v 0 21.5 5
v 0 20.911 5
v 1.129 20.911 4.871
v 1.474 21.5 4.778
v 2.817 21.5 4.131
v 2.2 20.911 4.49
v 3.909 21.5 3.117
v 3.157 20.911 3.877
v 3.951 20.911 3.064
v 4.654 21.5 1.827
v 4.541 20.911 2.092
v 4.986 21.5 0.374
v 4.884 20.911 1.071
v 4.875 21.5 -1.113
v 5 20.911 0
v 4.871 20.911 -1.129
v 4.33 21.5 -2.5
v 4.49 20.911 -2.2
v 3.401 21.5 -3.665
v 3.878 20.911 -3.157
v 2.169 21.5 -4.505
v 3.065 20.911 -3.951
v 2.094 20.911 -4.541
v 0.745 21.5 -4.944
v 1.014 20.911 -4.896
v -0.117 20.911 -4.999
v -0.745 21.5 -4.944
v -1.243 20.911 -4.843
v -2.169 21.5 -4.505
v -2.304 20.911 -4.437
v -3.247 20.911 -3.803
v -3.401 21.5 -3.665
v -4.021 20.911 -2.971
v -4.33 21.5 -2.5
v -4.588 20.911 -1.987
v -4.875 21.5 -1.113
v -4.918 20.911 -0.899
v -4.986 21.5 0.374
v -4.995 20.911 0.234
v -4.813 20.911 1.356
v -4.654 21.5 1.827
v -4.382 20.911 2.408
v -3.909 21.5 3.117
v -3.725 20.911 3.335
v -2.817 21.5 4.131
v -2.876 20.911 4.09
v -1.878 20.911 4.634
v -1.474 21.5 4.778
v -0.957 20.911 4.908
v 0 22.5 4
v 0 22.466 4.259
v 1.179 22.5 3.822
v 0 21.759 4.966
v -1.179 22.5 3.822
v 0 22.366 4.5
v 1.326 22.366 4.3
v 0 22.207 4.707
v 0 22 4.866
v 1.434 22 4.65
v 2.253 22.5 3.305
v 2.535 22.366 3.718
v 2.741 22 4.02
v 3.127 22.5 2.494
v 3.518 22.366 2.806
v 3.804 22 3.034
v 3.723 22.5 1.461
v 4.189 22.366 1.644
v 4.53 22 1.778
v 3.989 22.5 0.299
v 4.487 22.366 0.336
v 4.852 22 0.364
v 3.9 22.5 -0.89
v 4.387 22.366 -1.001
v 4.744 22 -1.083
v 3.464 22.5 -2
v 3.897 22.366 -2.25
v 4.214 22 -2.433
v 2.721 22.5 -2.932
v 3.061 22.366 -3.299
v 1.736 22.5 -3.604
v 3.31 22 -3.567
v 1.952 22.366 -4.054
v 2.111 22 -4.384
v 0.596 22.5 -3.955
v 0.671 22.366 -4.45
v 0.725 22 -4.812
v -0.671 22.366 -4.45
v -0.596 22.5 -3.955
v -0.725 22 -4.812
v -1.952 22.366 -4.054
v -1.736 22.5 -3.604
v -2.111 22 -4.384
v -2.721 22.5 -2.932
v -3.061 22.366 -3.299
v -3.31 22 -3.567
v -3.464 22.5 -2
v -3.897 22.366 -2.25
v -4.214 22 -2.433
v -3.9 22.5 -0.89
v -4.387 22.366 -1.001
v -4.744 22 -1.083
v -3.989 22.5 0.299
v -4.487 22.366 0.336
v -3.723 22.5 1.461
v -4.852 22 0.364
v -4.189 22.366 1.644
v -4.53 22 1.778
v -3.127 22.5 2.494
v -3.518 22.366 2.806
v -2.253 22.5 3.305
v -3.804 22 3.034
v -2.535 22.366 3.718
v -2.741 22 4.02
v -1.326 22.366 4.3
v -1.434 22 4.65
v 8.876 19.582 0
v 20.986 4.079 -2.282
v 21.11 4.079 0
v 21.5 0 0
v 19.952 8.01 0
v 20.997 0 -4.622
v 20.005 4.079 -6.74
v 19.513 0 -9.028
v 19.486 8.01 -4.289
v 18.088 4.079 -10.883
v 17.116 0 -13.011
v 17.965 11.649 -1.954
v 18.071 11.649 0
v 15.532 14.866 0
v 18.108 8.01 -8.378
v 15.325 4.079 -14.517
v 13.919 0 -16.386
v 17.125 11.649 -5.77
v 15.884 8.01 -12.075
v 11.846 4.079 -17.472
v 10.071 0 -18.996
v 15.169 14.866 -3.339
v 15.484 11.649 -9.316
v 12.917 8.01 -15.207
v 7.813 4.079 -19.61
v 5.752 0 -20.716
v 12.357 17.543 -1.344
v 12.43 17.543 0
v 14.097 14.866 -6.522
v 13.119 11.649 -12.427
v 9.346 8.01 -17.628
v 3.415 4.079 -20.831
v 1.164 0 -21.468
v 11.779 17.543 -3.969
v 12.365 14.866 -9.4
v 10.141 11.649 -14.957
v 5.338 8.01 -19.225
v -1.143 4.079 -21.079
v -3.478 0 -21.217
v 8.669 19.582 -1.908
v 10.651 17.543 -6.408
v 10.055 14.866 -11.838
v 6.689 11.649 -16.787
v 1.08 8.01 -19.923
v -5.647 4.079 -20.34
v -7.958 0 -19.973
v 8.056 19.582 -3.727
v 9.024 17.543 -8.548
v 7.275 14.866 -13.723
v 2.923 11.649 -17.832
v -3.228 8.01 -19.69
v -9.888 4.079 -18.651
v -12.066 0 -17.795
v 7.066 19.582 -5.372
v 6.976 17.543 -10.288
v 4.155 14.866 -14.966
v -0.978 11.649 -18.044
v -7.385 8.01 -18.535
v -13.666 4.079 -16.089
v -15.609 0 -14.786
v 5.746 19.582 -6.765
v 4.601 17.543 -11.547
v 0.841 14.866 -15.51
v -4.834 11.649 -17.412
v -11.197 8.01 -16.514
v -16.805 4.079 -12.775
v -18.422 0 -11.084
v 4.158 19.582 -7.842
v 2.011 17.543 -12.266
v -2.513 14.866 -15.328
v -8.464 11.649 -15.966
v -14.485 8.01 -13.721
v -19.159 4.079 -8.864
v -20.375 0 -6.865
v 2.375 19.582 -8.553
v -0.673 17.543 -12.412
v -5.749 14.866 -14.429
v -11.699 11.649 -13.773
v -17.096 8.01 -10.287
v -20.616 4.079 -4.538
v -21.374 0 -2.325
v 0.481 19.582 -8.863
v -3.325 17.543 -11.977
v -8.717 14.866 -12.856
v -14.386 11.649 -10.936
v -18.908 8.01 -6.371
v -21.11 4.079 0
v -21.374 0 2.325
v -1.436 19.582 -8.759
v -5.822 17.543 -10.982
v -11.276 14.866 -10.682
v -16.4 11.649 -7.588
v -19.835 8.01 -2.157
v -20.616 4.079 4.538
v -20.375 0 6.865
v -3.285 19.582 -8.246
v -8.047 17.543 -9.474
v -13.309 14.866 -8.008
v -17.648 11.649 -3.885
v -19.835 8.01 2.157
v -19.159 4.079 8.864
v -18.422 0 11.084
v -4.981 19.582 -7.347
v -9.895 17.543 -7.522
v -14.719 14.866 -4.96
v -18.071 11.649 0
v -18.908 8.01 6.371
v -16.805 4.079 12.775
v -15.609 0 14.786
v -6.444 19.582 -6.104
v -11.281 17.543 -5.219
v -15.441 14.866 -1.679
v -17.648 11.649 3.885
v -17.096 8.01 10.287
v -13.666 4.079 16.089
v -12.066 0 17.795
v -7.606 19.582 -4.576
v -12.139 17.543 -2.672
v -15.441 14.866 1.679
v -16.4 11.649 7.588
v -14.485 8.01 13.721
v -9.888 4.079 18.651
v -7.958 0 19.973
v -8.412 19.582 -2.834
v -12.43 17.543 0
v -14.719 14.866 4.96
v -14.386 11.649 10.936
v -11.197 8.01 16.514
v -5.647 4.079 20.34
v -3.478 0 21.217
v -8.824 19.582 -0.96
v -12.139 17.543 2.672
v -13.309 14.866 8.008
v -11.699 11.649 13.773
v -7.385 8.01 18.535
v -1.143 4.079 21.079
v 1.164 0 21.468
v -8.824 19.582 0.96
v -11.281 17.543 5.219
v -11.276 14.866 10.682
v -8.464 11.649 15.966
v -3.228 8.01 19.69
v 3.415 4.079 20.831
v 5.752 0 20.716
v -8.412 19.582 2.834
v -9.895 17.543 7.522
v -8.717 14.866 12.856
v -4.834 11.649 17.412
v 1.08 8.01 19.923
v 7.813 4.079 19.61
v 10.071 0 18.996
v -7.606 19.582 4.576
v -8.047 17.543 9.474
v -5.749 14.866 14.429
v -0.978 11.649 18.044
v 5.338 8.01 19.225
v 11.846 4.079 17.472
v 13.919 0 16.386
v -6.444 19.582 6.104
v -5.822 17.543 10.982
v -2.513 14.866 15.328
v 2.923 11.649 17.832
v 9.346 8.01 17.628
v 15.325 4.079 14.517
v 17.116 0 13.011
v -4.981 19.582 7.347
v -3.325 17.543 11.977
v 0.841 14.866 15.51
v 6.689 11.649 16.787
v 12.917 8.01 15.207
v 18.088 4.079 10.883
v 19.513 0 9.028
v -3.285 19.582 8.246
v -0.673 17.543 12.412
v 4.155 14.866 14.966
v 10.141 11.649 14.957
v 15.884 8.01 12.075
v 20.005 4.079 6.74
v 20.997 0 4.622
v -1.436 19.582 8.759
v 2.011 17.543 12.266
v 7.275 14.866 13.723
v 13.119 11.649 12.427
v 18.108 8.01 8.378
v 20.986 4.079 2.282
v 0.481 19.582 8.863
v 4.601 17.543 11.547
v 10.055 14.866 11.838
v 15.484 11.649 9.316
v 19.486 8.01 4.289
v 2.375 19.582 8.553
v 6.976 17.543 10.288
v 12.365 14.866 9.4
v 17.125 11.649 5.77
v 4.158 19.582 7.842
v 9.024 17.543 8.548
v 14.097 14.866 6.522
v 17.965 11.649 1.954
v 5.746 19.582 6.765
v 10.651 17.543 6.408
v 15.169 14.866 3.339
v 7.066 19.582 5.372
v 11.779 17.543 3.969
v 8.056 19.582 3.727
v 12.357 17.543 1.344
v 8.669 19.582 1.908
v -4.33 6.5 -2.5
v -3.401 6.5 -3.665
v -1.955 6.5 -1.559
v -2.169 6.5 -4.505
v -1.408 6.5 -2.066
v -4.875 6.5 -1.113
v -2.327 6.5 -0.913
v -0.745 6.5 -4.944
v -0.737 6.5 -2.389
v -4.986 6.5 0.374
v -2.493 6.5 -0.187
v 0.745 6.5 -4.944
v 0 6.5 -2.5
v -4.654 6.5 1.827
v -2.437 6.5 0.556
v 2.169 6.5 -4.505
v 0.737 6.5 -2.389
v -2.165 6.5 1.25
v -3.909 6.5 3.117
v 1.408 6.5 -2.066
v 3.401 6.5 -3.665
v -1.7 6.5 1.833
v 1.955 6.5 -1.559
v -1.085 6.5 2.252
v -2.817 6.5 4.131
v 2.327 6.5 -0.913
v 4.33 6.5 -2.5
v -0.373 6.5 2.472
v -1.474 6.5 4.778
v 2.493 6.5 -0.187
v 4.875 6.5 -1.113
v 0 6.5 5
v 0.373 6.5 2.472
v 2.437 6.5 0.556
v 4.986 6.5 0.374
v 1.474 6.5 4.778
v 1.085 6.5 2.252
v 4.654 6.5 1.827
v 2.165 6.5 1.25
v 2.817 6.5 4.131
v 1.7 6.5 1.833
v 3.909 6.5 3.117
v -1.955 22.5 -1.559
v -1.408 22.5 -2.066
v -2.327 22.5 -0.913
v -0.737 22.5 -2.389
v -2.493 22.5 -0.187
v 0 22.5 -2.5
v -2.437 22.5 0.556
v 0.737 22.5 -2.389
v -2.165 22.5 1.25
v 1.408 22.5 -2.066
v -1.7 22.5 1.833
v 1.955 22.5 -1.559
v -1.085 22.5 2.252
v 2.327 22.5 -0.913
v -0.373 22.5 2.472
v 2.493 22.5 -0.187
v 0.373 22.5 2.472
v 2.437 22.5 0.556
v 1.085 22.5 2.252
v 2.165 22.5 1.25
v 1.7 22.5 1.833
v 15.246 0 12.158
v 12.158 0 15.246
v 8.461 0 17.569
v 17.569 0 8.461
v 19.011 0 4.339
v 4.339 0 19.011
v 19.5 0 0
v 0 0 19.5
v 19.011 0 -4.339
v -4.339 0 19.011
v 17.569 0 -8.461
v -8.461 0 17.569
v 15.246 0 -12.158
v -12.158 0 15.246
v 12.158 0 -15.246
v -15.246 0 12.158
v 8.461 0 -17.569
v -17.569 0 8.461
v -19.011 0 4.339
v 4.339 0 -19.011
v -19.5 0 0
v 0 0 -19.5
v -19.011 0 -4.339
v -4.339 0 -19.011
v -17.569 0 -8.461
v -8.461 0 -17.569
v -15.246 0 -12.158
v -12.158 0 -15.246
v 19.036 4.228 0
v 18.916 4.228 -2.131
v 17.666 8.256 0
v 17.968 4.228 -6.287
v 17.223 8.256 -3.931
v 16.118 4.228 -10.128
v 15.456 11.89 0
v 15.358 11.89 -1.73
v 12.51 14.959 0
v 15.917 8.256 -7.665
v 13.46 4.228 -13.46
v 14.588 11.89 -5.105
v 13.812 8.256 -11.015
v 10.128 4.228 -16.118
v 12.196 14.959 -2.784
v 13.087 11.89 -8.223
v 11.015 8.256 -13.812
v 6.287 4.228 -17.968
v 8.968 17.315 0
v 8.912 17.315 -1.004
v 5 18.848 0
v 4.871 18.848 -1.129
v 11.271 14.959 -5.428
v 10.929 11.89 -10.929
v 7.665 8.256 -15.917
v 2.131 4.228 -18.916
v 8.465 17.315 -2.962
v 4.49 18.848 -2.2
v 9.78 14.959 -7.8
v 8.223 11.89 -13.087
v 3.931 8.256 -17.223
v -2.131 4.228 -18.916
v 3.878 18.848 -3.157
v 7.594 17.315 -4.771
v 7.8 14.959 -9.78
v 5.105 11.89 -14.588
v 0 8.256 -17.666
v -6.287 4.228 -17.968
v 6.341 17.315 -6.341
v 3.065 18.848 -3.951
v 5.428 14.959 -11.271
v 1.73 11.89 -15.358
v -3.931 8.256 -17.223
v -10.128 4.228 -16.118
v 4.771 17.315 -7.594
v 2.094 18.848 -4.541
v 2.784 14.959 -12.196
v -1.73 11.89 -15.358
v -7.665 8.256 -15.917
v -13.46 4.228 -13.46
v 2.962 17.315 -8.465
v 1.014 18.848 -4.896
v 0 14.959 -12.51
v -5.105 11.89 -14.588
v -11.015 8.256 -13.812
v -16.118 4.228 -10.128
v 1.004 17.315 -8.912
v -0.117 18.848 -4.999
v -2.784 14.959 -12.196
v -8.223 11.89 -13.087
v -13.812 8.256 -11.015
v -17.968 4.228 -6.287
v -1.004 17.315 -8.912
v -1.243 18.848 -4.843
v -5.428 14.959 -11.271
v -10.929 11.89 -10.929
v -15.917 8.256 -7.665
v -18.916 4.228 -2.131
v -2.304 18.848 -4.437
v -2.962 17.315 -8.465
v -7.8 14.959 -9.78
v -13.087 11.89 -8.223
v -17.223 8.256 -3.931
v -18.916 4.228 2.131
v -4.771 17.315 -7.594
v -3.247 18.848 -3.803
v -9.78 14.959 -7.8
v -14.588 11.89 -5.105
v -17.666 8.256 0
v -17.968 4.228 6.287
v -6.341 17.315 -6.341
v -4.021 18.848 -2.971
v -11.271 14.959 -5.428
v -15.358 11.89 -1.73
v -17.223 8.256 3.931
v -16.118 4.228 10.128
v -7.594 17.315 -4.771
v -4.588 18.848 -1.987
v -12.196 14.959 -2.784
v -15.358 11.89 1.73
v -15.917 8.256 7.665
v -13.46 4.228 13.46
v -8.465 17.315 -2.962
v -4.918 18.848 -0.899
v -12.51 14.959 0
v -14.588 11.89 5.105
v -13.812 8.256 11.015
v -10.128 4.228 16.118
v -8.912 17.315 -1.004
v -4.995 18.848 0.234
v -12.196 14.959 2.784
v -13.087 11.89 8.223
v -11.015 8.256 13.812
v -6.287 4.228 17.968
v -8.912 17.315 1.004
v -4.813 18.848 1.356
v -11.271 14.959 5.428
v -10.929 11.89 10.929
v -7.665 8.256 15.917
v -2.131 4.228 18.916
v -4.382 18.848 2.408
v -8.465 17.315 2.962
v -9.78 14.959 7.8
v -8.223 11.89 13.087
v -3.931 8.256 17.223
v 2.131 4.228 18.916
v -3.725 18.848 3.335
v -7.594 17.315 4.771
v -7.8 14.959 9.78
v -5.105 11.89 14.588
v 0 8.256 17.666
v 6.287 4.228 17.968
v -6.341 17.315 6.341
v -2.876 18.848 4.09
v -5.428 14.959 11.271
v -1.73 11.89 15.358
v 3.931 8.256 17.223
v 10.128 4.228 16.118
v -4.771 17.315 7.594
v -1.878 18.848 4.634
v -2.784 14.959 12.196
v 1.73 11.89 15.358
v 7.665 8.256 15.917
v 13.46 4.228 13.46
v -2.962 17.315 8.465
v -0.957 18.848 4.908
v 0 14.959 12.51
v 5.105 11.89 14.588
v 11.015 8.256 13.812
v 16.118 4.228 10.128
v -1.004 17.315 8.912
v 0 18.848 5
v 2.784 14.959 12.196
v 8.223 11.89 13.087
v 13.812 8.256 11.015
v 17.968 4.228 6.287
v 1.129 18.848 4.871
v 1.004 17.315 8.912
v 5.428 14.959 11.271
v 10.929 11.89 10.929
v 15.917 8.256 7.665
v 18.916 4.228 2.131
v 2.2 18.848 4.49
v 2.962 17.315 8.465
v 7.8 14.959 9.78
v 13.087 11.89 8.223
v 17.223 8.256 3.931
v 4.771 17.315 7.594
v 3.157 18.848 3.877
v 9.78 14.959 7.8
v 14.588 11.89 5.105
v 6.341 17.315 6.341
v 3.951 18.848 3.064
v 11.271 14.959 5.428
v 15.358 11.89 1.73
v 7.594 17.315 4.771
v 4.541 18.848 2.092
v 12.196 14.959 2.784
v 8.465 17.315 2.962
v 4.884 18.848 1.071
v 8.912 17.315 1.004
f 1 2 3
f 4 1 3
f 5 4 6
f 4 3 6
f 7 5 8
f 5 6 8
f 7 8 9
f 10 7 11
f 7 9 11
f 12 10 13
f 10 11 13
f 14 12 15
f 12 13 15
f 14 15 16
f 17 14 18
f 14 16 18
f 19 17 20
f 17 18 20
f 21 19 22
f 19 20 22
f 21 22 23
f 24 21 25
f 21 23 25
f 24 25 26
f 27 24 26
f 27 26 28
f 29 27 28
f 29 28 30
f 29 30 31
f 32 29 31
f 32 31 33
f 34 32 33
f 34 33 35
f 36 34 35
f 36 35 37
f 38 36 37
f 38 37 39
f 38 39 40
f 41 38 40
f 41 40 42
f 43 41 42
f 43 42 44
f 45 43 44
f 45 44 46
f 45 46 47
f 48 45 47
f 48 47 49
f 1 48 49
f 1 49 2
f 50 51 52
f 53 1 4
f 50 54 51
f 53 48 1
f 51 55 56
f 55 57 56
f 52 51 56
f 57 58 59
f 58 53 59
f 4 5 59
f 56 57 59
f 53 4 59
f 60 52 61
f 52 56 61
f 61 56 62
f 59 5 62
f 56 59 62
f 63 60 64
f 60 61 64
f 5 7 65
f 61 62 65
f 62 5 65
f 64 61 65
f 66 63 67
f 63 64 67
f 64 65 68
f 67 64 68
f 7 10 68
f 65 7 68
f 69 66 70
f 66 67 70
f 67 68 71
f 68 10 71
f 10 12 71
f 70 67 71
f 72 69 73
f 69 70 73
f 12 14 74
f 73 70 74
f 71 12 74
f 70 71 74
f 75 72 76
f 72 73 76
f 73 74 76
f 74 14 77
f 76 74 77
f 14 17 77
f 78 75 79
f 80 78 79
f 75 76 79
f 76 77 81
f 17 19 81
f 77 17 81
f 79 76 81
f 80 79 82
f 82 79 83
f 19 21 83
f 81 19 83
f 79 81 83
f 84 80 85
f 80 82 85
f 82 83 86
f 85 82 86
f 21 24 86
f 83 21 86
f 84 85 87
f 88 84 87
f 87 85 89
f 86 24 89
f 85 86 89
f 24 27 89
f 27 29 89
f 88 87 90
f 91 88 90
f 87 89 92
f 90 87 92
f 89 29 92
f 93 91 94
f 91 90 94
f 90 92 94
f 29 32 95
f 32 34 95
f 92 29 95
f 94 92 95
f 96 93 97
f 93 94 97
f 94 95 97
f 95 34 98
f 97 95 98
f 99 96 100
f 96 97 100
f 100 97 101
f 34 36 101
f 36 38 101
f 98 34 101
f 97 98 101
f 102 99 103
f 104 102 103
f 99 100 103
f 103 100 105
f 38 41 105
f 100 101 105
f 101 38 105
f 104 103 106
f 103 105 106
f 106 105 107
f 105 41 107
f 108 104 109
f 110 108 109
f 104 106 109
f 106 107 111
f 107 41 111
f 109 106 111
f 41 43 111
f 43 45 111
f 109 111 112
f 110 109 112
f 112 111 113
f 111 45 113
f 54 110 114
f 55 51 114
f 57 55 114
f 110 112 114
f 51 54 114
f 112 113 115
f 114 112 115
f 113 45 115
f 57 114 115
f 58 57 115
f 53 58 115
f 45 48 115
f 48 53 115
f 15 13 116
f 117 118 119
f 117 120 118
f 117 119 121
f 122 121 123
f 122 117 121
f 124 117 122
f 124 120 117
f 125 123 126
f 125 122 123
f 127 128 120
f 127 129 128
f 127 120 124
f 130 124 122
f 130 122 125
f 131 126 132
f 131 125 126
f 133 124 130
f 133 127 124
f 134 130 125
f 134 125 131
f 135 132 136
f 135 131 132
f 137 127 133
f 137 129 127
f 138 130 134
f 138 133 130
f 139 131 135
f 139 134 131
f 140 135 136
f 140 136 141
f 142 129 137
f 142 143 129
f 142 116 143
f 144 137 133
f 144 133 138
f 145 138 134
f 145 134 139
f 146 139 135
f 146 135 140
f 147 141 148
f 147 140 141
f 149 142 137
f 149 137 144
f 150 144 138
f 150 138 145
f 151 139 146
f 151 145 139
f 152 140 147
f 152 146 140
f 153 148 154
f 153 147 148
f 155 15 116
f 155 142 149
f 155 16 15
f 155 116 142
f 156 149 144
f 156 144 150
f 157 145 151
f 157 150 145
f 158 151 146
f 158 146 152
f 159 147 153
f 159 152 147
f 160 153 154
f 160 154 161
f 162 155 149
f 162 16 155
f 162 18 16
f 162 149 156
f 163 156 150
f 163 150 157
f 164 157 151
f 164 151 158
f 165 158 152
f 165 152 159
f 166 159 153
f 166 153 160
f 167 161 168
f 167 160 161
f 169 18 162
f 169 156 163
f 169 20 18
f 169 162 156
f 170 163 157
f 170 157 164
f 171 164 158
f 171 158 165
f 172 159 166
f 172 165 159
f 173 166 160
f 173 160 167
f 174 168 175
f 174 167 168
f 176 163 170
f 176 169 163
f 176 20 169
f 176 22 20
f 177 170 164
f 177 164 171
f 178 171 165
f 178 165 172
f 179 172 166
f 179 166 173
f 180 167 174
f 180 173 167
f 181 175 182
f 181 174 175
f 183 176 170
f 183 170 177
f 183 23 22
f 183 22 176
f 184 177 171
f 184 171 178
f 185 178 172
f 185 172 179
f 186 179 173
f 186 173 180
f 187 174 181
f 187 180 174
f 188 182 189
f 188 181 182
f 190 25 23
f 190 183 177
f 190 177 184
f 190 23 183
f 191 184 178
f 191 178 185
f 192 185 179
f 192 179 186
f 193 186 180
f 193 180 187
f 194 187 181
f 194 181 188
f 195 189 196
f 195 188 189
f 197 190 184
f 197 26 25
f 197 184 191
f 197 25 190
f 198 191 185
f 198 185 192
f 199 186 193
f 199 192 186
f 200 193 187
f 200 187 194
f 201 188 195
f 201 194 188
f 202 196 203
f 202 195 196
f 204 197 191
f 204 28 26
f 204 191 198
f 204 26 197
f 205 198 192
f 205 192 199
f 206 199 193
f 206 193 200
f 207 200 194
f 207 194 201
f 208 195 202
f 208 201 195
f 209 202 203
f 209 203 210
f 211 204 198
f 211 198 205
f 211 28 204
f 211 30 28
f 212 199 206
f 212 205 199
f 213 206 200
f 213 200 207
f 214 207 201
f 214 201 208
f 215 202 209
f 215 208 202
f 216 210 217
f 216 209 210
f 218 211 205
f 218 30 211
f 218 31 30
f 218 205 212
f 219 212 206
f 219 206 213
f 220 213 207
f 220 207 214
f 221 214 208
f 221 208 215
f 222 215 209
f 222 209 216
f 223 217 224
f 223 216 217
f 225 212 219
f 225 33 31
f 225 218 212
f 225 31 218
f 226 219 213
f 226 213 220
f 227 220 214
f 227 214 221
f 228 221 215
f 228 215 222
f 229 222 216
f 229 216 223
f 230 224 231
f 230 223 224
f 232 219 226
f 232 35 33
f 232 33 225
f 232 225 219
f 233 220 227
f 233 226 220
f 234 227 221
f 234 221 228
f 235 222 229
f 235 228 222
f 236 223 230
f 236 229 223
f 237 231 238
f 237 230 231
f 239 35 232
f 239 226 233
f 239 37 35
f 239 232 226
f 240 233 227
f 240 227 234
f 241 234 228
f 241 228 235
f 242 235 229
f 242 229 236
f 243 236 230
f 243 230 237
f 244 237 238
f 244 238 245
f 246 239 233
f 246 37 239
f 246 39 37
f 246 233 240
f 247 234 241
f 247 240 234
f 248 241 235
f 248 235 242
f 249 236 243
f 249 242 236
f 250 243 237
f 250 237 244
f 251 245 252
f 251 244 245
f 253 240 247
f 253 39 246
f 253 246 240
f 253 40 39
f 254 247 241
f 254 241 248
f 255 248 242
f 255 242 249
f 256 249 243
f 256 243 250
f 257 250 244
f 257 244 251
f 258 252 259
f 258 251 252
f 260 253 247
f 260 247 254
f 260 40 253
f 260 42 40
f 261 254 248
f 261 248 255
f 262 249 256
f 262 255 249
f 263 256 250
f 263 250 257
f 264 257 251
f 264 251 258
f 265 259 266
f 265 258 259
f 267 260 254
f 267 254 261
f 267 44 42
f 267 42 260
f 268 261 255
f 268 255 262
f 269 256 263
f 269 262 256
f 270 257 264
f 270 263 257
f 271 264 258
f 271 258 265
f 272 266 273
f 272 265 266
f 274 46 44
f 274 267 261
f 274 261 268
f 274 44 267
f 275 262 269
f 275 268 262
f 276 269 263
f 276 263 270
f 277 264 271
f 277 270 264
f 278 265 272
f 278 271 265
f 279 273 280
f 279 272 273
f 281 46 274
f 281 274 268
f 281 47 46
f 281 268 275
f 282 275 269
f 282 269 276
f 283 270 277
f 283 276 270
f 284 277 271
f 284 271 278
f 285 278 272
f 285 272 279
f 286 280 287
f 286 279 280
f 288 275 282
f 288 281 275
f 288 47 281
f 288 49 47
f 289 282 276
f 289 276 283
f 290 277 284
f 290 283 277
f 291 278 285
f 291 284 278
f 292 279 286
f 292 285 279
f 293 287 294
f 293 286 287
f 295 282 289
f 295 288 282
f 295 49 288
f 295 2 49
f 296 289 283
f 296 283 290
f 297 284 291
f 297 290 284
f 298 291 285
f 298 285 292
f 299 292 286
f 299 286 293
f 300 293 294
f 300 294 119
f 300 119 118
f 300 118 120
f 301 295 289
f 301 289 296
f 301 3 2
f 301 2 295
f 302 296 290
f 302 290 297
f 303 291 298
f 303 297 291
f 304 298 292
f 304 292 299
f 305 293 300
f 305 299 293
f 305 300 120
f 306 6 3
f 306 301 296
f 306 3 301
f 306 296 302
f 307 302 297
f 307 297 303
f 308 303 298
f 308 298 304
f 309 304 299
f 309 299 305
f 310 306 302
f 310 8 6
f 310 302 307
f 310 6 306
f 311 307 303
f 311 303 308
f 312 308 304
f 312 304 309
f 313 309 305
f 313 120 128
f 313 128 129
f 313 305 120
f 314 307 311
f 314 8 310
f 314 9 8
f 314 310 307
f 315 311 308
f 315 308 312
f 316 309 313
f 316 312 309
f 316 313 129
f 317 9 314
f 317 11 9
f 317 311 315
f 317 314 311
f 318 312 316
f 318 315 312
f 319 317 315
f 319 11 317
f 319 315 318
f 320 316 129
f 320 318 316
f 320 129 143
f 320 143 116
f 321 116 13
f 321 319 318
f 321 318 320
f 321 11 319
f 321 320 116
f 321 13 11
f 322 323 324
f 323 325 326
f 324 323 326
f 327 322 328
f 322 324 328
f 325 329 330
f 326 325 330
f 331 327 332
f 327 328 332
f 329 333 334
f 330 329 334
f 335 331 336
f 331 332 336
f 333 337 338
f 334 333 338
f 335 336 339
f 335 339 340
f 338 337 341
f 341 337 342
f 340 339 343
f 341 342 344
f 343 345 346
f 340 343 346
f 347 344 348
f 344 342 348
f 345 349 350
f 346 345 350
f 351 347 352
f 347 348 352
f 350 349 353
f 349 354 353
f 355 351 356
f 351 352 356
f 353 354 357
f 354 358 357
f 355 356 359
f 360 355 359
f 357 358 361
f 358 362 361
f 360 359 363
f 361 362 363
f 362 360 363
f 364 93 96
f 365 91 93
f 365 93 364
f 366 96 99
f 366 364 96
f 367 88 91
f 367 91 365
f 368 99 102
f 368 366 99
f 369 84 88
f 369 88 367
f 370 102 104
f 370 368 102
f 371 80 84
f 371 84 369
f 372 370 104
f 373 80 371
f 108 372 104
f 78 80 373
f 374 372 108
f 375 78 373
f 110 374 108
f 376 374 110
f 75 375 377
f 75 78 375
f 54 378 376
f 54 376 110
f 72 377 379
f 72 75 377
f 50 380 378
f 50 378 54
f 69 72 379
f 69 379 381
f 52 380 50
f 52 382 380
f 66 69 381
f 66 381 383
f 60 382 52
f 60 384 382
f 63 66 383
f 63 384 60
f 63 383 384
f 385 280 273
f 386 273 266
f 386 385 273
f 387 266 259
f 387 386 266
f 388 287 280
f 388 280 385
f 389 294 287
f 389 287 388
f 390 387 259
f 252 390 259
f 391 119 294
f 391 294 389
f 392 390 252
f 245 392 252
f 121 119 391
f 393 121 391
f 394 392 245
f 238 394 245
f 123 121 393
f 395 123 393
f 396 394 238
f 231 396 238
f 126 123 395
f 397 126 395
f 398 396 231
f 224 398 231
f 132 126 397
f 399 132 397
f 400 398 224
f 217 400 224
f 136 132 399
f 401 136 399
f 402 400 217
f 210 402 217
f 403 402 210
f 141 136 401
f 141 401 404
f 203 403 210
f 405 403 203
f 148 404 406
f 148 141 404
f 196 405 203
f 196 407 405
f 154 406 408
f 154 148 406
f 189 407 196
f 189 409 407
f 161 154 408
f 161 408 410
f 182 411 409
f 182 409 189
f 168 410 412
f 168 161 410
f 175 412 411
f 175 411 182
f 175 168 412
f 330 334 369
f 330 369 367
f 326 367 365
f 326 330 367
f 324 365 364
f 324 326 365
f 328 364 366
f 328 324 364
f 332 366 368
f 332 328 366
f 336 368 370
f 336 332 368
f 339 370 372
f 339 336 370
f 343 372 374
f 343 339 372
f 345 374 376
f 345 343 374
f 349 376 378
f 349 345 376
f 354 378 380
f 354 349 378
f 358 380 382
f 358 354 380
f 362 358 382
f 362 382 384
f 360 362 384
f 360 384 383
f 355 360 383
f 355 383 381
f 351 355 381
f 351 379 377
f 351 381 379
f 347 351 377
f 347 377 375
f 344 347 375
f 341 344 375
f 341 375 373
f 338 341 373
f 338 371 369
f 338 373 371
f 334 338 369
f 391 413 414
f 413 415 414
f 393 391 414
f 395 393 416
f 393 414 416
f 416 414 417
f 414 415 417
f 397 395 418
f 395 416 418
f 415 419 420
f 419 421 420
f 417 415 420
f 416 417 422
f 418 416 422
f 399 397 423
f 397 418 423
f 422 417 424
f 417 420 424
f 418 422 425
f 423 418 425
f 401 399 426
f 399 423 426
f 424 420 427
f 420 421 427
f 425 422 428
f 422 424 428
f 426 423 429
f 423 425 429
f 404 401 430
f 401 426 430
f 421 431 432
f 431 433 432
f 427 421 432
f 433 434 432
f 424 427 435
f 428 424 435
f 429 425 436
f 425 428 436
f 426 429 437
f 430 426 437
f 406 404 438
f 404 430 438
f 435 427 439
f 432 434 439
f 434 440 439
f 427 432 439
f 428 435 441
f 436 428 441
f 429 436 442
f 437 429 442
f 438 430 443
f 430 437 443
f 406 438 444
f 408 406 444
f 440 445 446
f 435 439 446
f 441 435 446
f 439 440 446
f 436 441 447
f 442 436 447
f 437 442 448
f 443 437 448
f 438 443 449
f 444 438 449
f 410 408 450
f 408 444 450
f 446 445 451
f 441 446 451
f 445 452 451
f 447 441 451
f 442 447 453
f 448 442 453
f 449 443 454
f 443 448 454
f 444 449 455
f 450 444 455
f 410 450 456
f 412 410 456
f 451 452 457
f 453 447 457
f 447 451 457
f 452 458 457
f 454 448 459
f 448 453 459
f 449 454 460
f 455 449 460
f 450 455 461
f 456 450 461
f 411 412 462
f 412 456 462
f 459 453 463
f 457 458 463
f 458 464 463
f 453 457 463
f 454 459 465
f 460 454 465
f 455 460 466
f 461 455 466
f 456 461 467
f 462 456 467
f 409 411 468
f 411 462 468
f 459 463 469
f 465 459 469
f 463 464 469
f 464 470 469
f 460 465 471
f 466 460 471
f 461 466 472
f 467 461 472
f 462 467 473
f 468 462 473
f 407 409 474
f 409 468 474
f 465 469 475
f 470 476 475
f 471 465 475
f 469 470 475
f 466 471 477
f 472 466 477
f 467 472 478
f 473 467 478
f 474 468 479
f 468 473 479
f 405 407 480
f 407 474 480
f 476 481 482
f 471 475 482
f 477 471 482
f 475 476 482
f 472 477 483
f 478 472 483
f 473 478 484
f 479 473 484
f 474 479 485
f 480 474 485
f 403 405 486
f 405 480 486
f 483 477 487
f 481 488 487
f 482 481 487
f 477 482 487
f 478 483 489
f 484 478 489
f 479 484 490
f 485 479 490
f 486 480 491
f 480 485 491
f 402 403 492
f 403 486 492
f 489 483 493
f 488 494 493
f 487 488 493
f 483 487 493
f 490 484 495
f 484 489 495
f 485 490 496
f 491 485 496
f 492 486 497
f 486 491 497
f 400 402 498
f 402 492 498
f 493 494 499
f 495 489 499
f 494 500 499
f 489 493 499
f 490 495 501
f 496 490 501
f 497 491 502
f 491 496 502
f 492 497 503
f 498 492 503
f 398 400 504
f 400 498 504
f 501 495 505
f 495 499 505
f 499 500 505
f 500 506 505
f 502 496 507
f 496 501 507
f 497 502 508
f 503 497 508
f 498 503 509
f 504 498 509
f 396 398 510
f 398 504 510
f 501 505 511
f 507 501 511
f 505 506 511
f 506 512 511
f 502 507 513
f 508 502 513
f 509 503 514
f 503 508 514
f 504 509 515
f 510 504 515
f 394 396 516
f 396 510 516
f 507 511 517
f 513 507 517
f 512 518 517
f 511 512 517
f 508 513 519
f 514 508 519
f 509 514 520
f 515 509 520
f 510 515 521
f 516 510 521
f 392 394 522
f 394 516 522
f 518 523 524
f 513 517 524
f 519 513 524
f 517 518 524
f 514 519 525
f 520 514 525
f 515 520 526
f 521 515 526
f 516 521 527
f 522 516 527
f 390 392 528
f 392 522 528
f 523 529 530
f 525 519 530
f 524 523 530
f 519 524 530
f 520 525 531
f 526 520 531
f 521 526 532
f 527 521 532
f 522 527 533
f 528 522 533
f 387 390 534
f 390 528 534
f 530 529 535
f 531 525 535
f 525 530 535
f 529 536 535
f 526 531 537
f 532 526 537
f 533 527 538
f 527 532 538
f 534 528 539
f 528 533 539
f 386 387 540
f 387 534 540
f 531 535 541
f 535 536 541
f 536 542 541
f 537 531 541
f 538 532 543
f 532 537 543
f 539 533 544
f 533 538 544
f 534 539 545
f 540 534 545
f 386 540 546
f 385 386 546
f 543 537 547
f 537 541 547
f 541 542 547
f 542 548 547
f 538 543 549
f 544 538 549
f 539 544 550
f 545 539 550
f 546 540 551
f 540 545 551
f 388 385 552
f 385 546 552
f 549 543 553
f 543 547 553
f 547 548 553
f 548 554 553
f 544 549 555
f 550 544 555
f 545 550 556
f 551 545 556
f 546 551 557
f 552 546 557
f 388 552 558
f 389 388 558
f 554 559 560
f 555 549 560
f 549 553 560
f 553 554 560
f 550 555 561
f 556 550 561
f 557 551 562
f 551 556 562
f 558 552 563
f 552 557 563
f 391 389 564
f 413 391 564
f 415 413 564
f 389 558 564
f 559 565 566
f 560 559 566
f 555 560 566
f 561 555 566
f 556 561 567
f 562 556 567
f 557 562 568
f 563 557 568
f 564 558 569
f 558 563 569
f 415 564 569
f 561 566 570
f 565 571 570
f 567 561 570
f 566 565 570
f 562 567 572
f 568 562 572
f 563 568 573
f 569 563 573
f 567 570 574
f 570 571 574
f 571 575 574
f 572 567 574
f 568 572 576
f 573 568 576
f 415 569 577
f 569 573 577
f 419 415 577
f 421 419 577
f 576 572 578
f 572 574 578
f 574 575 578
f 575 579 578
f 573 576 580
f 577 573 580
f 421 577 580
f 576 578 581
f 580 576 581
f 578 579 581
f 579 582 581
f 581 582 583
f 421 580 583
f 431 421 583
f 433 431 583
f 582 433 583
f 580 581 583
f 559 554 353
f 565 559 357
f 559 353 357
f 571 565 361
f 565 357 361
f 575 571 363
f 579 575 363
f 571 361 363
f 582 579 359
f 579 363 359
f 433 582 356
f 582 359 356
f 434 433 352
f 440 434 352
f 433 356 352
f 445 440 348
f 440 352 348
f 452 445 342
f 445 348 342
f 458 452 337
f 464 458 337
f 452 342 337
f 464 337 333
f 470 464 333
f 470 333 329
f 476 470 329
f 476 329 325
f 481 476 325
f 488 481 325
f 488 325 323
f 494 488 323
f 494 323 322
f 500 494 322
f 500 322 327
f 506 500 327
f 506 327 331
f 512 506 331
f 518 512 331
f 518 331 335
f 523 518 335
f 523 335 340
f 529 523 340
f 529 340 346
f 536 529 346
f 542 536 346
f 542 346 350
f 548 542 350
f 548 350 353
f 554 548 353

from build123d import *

# Parameters (mm, degrees)
SHELL1_T                 = -2
BOSS_EXTRUDE6_DEPTH      = 1
BOSS_EXTRUDE6_DEPTH_BACK = 15
SKETCH4_R                = 5
SKETCH2_R                = 2.5
CUT_EXTRUDE3_DEPTH       = 38.825256113
FILLET1_R                = 1


with BuildPart() as part:
    # Sketch1 → Revolve1 (revolve)
    with BuildSketch(Plane.XY):
        with BuildLine():
            Line((0, 0), (21.5, 0))
            ThreePointArc((21.5, 0), (15.202795796, 15.202795796), (0, 21.5))
            Line((0, 21.5), (0, 0))
        make_face()
    revolve(axis=Axis((0, 0, 0), (0, 1, 0)))

    # Shell1
    shell1_openings = [part.faces().sort_by_distance(p)[0] for p in [
        (0, 0, 0),
    ]]
    offset(amount=SHELL1_T, openings=shell1_openings, kind=Kind.INTERSECTION)

    # Sketch4 → Boss-Extrude6 (add, two sides: drawn at the far end of the back side and taken through both)
    with BuildSketch(Plane(origin=(0, 21.5, 0), x_dir=(1, 0, 0), z_dir=(0, 1, 0)).offset(-BOSS_EXTRUDE6_DEPTH_BACK)):
        with Locations(Location((0, 0, 0), (0, 0, 270))):
            Circle(SKETCH4_R)
    extrude(amount=BOSS_EXTRUDE6_DEPTH + BOSS_EXTRUDE6_DEPTH_BACK)

    # Sketch2 → Cut-Extrude3 (cut, through all)
    with BuildSketch(Plane(origin=(0, 0, 0), x_dir=(1, 0, 0), z_dir=(0, 1, 0))):
        with Locations(Location((0, 0, 0), (0, 0, 90))):
            Circle(SKETCH2_R)
    extrude(amount=CUT_EXTRUDE3_DEPTH, mode=Mode.SUBTRACT)

    # Fillet1
    fillet1_edges = [part.edges().sort_by_distance(p)[0] for p in [
        (0, 22.5, -5),
    ]]
    fillet(fillet1_edges, radius=FILLET1_R)


solid = part.part
